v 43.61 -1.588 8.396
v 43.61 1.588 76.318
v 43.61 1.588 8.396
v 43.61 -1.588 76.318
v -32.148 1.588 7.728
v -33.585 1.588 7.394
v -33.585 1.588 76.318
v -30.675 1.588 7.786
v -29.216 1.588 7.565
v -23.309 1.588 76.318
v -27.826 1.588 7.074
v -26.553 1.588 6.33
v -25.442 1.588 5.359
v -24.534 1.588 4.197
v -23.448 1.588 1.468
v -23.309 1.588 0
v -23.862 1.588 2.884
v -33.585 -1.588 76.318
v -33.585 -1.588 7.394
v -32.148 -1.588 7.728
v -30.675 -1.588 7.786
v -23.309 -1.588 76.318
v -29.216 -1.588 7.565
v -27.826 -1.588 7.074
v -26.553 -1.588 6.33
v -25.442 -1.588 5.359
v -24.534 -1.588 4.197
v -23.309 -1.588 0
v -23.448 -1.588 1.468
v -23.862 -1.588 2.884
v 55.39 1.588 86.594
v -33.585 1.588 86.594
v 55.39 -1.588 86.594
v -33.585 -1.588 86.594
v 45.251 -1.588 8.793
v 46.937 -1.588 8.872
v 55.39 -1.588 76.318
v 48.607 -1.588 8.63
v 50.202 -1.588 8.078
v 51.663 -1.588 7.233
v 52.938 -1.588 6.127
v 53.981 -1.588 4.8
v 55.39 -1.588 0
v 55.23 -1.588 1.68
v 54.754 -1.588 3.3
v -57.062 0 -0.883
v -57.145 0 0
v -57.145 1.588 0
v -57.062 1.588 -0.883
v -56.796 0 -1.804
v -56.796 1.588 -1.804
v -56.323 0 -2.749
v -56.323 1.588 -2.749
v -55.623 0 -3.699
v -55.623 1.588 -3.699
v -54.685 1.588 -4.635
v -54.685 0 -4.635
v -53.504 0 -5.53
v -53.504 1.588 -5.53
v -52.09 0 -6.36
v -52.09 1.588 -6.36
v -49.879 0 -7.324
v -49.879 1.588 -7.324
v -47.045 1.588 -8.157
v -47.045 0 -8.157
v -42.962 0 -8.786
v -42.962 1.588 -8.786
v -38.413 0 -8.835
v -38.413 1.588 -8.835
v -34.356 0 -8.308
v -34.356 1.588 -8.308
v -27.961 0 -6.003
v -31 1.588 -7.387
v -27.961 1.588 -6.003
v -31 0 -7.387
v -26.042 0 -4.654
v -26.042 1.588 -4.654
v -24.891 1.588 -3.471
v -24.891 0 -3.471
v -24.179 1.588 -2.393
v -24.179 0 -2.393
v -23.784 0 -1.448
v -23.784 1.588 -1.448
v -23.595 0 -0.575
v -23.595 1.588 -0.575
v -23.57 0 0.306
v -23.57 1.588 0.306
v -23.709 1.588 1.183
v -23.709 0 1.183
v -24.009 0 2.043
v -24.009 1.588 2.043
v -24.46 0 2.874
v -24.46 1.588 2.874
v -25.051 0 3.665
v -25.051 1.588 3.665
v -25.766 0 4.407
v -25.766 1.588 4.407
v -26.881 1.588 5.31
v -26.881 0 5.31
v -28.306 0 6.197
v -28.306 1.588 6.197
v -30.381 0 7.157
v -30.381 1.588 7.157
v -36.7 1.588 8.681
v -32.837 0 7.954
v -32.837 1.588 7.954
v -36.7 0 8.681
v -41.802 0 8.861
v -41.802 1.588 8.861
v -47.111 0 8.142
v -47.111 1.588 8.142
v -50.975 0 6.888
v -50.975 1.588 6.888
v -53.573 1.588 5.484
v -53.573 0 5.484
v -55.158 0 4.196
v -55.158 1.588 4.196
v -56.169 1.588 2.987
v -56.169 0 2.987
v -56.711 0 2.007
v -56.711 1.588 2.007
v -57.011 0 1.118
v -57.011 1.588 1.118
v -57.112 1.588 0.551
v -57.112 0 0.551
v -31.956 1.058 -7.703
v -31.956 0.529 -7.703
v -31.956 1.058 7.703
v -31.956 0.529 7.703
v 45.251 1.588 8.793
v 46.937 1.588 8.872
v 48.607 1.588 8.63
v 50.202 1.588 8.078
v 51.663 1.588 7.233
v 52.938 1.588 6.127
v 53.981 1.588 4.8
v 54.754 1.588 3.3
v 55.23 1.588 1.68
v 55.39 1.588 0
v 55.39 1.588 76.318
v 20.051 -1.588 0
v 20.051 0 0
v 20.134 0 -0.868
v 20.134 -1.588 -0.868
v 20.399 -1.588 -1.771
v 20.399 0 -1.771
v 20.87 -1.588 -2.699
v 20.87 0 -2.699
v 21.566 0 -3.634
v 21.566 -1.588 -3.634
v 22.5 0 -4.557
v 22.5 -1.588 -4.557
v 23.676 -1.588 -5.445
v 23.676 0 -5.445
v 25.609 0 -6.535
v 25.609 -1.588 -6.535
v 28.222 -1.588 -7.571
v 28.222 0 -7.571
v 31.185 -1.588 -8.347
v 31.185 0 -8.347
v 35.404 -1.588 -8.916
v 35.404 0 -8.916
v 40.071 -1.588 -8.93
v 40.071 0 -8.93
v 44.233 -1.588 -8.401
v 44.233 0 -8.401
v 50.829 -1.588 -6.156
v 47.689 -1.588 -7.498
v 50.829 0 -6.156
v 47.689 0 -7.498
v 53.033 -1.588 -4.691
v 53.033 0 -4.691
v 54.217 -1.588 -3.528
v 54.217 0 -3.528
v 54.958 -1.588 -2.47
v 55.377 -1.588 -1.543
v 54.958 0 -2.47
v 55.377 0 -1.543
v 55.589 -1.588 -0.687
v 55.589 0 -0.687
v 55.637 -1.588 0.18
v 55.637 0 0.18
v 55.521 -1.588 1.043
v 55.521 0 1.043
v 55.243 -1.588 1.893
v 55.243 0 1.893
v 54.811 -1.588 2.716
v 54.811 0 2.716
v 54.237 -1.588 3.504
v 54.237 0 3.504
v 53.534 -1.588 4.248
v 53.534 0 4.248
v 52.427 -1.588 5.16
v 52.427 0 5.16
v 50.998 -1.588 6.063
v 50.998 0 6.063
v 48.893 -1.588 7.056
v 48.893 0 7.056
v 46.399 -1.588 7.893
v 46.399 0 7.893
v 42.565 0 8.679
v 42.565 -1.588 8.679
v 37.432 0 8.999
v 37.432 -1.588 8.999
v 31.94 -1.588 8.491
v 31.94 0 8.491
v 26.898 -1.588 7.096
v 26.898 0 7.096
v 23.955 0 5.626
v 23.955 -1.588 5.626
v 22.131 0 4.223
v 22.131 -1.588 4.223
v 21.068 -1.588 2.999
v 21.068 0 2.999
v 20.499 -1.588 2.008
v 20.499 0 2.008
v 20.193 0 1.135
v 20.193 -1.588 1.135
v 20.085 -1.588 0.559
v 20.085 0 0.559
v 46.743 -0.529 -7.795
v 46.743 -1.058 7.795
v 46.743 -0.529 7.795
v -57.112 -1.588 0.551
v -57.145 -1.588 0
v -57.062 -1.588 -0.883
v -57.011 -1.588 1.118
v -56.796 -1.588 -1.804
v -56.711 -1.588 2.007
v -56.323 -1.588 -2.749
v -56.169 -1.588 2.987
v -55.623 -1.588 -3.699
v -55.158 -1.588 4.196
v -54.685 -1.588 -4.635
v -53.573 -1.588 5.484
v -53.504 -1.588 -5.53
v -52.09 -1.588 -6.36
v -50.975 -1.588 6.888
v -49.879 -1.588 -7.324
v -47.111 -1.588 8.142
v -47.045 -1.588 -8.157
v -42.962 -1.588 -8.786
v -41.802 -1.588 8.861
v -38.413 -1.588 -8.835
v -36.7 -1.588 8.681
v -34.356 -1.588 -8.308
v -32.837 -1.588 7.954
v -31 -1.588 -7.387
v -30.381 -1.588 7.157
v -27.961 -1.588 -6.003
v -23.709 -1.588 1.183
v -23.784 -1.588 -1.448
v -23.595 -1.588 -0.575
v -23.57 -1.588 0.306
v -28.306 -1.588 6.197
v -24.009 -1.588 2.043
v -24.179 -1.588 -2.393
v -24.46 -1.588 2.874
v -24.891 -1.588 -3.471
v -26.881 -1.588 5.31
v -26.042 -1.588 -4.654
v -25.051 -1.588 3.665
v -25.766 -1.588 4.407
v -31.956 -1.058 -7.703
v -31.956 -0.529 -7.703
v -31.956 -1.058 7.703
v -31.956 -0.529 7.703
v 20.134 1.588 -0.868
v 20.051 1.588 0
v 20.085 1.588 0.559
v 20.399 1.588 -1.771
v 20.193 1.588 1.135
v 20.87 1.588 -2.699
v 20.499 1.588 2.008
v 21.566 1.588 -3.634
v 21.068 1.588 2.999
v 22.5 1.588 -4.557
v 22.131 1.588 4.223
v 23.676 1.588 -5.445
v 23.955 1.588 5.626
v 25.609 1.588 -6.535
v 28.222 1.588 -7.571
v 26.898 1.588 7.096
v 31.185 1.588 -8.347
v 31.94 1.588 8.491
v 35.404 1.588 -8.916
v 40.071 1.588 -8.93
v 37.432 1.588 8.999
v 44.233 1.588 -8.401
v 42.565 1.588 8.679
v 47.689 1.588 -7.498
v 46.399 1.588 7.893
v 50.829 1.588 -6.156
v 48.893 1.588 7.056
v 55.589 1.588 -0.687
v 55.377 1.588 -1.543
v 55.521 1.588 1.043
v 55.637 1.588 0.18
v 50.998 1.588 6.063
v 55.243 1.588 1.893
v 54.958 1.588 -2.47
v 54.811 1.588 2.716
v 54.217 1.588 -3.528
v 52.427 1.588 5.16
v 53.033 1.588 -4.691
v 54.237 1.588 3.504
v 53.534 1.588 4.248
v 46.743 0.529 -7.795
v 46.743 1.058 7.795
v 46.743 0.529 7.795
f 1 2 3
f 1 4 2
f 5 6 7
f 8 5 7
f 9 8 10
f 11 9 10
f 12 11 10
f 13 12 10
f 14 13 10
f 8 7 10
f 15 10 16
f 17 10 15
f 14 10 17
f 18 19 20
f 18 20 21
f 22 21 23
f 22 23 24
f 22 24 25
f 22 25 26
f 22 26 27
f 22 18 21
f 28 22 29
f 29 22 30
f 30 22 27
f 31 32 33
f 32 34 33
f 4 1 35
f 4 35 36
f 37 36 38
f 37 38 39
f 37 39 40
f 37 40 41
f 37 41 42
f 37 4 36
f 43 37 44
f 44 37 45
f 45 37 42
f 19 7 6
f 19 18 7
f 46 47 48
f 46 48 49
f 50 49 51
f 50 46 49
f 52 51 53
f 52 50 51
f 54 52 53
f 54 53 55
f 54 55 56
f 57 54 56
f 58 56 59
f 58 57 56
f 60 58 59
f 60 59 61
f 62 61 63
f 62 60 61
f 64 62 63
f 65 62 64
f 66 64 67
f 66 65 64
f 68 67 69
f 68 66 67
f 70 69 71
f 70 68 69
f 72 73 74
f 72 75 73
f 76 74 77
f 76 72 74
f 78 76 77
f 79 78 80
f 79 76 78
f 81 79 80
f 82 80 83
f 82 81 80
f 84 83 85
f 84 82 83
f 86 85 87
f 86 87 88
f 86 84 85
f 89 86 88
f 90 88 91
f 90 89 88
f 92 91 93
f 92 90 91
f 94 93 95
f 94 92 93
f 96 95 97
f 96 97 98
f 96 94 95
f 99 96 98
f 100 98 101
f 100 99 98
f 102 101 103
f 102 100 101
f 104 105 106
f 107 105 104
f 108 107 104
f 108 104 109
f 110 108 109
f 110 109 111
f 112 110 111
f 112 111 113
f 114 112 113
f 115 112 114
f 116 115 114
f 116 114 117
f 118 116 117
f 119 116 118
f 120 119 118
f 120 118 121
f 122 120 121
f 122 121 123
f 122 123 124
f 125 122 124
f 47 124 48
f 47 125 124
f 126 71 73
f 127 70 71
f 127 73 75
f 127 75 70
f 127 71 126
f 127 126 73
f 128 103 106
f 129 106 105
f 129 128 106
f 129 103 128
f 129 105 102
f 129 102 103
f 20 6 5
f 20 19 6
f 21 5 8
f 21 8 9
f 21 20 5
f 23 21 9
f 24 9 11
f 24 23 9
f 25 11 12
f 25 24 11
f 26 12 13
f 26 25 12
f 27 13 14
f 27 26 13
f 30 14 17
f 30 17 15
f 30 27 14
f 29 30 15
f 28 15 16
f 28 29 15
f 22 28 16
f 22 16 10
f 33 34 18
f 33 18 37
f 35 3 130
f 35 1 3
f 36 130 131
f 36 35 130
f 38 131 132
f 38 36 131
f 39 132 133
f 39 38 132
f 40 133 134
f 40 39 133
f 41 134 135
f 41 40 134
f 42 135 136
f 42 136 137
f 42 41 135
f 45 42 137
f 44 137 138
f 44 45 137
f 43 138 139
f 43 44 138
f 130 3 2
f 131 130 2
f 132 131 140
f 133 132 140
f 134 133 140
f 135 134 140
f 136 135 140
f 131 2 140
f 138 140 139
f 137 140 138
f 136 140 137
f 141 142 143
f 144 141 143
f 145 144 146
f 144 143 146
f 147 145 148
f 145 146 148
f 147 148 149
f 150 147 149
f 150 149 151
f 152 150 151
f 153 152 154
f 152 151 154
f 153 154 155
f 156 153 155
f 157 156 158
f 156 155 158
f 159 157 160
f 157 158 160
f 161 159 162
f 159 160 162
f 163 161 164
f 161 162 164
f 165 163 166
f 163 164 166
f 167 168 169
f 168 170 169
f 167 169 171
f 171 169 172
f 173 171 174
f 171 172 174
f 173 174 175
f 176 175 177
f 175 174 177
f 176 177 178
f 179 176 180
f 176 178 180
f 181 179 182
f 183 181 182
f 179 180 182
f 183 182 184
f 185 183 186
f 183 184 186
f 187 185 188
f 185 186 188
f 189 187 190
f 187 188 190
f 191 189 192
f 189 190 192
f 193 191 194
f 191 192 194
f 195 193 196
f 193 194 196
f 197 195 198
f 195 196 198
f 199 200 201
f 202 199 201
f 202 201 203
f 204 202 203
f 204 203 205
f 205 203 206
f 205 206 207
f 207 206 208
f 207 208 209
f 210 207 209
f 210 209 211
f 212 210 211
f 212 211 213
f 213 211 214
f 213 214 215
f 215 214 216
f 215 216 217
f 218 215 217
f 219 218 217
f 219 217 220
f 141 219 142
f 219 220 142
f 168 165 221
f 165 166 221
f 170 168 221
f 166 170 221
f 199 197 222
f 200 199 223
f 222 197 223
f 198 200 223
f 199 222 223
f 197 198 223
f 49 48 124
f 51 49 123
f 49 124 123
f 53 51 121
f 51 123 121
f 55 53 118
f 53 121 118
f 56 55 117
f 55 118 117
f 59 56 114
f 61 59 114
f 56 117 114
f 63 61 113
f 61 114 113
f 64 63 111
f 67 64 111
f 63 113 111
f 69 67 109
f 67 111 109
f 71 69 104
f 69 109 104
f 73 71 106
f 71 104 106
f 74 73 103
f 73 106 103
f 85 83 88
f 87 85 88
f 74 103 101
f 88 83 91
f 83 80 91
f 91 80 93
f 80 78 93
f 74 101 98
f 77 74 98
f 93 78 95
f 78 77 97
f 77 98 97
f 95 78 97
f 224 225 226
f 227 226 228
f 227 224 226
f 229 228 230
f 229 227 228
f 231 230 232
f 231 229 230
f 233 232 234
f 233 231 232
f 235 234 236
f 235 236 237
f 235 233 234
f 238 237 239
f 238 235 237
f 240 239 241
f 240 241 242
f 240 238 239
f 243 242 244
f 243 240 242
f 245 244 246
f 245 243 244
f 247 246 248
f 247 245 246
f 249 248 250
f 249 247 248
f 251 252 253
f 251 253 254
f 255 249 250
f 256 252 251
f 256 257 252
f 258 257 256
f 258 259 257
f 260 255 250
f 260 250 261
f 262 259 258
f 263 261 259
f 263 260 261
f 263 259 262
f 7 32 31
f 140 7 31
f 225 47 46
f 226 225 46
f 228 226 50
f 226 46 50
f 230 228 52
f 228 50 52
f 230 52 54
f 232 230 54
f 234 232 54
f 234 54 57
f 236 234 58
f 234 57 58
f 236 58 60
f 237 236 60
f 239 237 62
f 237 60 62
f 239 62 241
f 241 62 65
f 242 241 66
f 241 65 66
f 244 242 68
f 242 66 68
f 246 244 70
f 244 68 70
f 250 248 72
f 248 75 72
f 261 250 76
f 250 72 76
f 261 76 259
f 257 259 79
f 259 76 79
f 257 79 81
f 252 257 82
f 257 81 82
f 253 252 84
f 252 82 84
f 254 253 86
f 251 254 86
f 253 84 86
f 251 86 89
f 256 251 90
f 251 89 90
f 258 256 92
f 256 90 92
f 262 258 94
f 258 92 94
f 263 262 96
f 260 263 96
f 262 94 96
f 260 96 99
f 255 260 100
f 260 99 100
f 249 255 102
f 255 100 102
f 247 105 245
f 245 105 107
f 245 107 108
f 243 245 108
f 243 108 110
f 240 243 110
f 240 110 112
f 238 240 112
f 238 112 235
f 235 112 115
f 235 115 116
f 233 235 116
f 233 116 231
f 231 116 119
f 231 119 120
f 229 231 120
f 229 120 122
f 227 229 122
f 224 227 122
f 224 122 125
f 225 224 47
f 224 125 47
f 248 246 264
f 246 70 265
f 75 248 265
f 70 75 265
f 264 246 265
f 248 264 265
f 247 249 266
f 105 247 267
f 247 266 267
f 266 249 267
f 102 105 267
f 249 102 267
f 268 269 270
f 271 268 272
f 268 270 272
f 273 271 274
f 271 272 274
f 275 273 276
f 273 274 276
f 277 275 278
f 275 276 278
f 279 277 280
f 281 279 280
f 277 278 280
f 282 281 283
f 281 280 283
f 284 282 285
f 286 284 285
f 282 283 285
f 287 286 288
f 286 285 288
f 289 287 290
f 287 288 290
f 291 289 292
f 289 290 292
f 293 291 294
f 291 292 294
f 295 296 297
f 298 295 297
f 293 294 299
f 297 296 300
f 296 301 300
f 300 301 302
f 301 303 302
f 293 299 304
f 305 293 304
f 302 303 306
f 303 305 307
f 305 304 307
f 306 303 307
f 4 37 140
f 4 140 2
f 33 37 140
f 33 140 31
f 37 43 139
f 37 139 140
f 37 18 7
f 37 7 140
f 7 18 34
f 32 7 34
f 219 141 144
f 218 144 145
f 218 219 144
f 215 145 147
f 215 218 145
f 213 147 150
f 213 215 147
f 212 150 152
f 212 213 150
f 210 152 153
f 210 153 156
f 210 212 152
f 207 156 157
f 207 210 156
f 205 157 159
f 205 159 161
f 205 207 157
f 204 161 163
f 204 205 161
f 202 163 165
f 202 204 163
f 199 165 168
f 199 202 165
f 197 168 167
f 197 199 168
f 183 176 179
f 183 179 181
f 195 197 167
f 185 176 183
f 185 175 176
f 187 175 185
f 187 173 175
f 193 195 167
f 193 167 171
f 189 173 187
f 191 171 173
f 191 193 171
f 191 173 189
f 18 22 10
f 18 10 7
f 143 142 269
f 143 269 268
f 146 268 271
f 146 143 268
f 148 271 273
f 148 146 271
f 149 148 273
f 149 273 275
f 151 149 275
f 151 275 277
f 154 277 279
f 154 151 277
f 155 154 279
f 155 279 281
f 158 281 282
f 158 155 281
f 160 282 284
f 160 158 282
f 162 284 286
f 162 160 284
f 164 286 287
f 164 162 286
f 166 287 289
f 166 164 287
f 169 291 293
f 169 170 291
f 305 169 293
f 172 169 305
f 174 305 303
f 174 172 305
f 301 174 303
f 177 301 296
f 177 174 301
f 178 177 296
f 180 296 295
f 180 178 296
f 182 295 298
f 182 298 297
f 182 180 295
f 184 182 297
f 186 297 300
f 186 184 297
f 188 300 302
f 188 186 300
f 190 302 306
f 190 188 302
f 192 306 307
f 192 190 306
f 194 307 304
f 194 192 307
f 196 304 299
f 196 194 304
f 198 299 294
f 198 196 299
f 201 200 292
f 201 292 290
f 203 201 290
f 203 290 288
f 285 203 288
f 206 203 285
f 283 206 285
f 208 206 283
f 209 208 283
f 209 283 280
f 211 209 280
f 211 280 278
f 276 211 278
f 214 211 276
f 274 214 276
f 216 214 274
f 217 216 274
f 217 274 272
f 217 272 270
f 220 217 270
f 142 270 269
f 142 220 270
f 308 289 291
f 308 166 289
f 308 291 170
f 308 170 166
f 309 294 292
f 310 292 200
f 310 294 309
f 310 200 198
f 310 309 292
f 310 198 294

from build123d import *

# Parameters (mm, degrees)
F5_DEPTH = 1.5875
F4_W     = 88.9750905335
F4_H     = 10.2759972215


with BuildPart() as f5:
    # F0 (on Front) → F5 (new body, symmetric)
    with BuildSketch(Plane.XZ):
        with BuildLine():
            add(Edge.make_bspline(
                [(-57.1445673704, 0), (-57.1445673704, -15.4052348919), (-31.9558419287, -7.702617446), (-6.767116487, 0), (-31.9558419287, 7.702617446), (-57.1445673704, 15.4052348919), (-57.1445673704, 0)],
                knots=[0, 0, 0, 2.0943951024, 2.0943951024, 4.1887902048, 4.1887902048, 6.2831853072, 6.2831853072, 6.2831853072], degree=2, weights=[1, 0.5, 1, 0.5, 1, 0.5, 1]))
        make_face()
    extrude(amount=F5_DEPTH, both=True)


with BuildPart() as f5b:
    # F1 (on Front) → F5, piece 2 (new body, symmetric)
    with BuildSketch(Plane.XZ):
        with BuildLine():
            add(Edge.make_bspline(
                [(20.0507249683, 0), (20.0507249683, -15.5901480304), (46.743250452, -7.7950740152), (73.4357759356, 0), (46.743250452, 7.7950740152), (20.0507249683, 15.5901480304), (20.0507249683, 0)],
                knots=[0, 0, 0, 2.0943951024, 2.0943951024, 4.1887902048, 4.1887902048, 6.2831853072, 6.2831853072, 6.2831853072], degree=2, weights=[1, 0.5, 1, 0.5, 1, 0.5, 1]))
        make_face()
    extrude(amount=F5_DEPTH, both=True)


with BuildPart() as f5c:
    # F2 (on Front) → F5, piece 3 (new body, symmetric)
    with BuildSketch(Plane.XZ):
        with BuildLine():
            ThreePointArc((-33.5849635303, 7.393701002), (-26.5525628246, 6.3297498648), (-23.3089663088, 0))
            Line((-23.3089663088, 0), (-23.3089663088, 76.3180628419))
            Line((-23.3089663088, 76.3180628419), (-33.5849635303, 76.3180628419))
            Line((-33.5849635303, 76.3180628419), (-33.5849635303, 7.393701002))
        make_face()
    extrude(amount=F5_DEPTH, both=True)


with BuildPart() as f5d:
    # F3 (on Front) → F5, piece 4 (new body, symmetric)
    with BuildSketch(Plane.XZ):
        with BuildLine():
            ThreePointArc((43.6103269458, 8.3962371573), (51.6633287809, 7.2329193241), (55.3901270032, 0))
            Line((55.3901270032, 0), (55.3901270032, 76.3180628419))
            Line((55.3901270032, 76.3180628419), (43.6103269458, 76.3180628419))
            Line((43.6103269458, 76.3180628419), (43.6103269458, 8.3962371573))
        make_face()
    extrude(amount=F5_DEPTH, both=True)


with BuildPart() as f5e:
    # F4 (on Front) → F5, piece 5 (new body, symmetric)
    with BuildSketch(Plane.XZ):
        with Locations((10.9025817364, 81.4560614526)):
            Rectangle(F4_W, F4_H)
    extrude(amount=F5_DEPTH, both=True)


solid = Compound([f5.part, f5b.part, f5c.part, f5d.part, f5e.part])
